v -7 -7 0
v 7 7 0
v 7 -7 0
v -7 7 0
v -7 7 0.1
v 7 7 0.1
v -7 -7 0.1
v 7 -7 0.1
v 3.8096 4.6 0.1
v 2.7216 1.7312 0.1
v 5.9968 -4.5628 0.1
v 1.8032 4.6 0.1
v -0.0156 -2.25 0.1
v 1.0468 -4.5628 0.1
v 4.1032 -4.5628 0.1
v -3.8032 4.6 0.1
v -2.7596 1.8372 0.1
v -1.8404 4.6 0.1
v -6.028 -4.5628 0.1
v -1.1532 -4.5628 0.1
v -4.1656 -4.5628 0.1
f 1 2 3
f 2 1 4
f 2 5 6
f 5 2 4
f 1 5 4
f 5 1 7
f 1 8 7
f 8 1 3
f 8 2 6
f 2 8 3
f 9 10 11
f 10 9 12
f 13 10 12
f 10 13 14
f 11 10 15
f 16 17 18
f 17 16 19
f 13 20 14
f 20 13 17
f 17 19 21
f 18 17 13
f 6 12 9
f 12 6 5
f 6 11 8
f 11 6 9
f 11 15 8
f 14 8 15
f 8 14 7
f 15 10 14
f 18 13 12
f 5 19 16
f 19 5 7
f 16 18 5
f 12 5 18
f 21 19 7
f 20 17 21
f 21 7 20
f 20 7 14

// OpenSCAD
// file: ../p/4-4edge.scad
use <../lib.scad>
$fa=1; $fs=0.2;
function ldraw_lib__4_4edge(realsolid=false) = [
// 0 Circle 1.0
// 0 Name: 4-4edge.dat
// 0 Author: James Jessiman
// 0 !LDRAW_ORG Primitive UPDATE 2017-01
// 0 !LICENSE Licensed under CC BY 2.0 and CC BY 4.0 : see CAreadme.txt
// 
// 0 BFC CERTIFY CCW
  [0,"BFC","CERTIFY"],
  [0,"BFC","CCW"],
// 
// 0 !HISTORY 1998-12-15 [PTadmin] Official Update 1998-10
// 0 !HISTORY 2005-12-28 [PTadmin] Official Update 2005-01
// 0 !HISTORY 2007-06-24 [PTadmin] Header formatted for Contributor Agreement
// 0 !HISTORY 2008-07-01 [PTadmin] Official Update 2008-01
// 0 !HISTORY 2017-01-15 [Steffen] BFCed
// 0 !HISTORY 2017-12-30 [PTadmin] Official Update 2017-01
// 
// 
// 2 24 1 0 0 0.9239 0 0.3827
  [2,24,1,0,0,0.9239,0,0.3827],
// 2 24 0.9239 0 0.3827 0.7071 0 0.7071
  [2,24,0.9239,0,0.3827,0.7071,0,0.7071],
// 2 24 0.7071 0 0.7071 0.3827 0 0.9239
  [2,24,0.7071,0,0.7071,0.3827,0,0.9239],
// 2 24 0.3827 0 0.9239 0 0 1
  [2,24,0.3827,0,0.9239,0,0,1],
// 2 24 0 0 1 -0.3827 0 0.9239
  [2,24,0,0,1,-0.3827,0,0.9239],
// 2 24 -0.3827 0 0.9239 -0.7071 0 0.7071
  [2,24,-0.3827,0,0.9239,-0.7071,0,0.7071],
// 2 24 -0.7071 0 0.7071 -0.9239 0 0.3827
  [2,24,-0.7071,0,0.7071,-0.9239,0,0.3827],
// 2 24 -0.9239 0 0.3827 -1 0 -0
  [2,24,-0.9239,0,0.3827,-1,0,-0],
// 2 24 -1 0 -0 -0.9239 0 -0.3827
  [2,24,-1,0,-0,-0.9239,0,-0.3827],
// 2 24 -0.9239 0 -0.3827 -0.7071 0 -0.7071
  [2,24,-0.9239,0,-0.3827,-0.7071,0,-0.7071],
// 2 24 -0.7071 0 -0.7071 -0.3827 0 -0.9239
  [2,24,-0.7071,0,-0.7071,-0.3827,0,-0.9239],
// 2 24 -0.3827 0 -0.9239 0 0 -1
  [2,24,-0.3827,0,-0.9239,0,0,-1],
// 2 24 0 0 -1 0.3827 0 -0.9239
  [2,24,0,0,-1,0.3827,0,-0.9239],
// 2 24 0.3827 0 -0.9239 0.7071 0 -0.7071
  [2,24,0.3827,0,-0.9239,0.7071,0,-0.7071],
// 2 24 0.7071 0 -0.7071 0.9239 0 -0.3827
  [2,24,0.7071,0,-0.7071,0.9239,0,-0.3827],
// 2 24 0.9239 0 -0.3827 1 0 0
  [2,24,0.9239,0,-0.3827,1,0,0],
];
module ldraw_lib__4_4edge(step=0, col=false, unit=2/5, alt=false, line=0.2, solid=!$preview)
    makepoly(ldraw_lib__4_4edge(solid), step=step, col=col, unit=unit, alt=alt, line=line, solid=solid);
ldraw_lib__4_4edge(line=0.2);
// file: ../p/4-4disc.scad
use <../lib.scad>
$fa=1; $fs=0.2;
function ldraw_lib__4_4disc(realsolid=false) = [
// 0 Disc 1.0
// 0 Name: 4-4disc.dat
// 0 Author: James Jessiman
// 0 !LDRAW_ORG Primitive UPDATE 2002-02
// 0 !LICENSE Licensed under CC BY 2.0 and CC BY 4.0 : see CAreadme.txt
// 
// 0 BFC CERTIFY CCW
  [0,"BFC","CERTIFY"],
  [0,"BFC","CCW"],
// 
// 0 !HISTORY 1998-12-15 [PTadmin] Official Update 1998-10
// 0 !HISTORY 2002-03-23 [sbliss] Added BFC statement
// 0 !HISTORY 2002-04-25 [PTadmin] Official Update 2002-02
// 0 !HISTORY 2007-06-24 [PTadmin] Header formatted for Contributor Agreement
// 0 !HISTORY 2008-07-01 [PTadmin] Official Update 2008-01
// 
// 
// 3 16 0 0 0 1 0 0 0.9239 0 0.3827
  [3,16,0,0,0,1,0,0,0.9239,0,0.3827],
// 3 16 0 0 0 0.9239 0 0.3827 0.7071 0 0.7071
  [3,16,0,0,0,0.9239,0,0.3827,0.7071,0,0.7071],
// 3 16 0 0 0 0.7071 0 0.7071 0.3827 0 0.9239
  [3,16,0,0,0,0.7071,0,0.7071,0.3827,0,0.9239],
// 3 16 0 0 0 0.3827 0 0.9239 0 0 1
  [3,16,0,0,0,0.3827,0,0.9239,0,0,1],
// 3 16 0 0 0 0 0 1 -0.3827 0 0.9239
  [3,16,0,0,0,0,0,1,-0.3827,0,0.9239],
// 3 16 0 0 0 -0.3827 0 0.9239 -0.7071 0 0.7071
  [3,16,0,0,0,-0.3827,0,0.9239,-0.7071,0,0.7071],
// 3 16 0 0 0 -0.7071 0 0.7071 -0.9239 0 0.3827
  [3,16,0,0,0,-0.7071,0,0.7071,-0.9239,0,0.3827],
// 3 16 0 0 0 -0.9239 0 0.3827 -1 0 -0
  [3,16,0,0,0,-0.9239,0,0.3827,-1,0,-0],
// 3 16 0 0 0 -1 0 -0 -0.9239 0 -0.3827
  [3,16,0,0,0,-1,0,-0,-0.9239,0,-0.3827],
// 3 16 0 0 0 -0.9239 0 -0.3827 -0.7071 0 -0.7071
  [3,16,0,0,0,-0.9239,0,-0.3827,-0.7071,0,-0.7071],
// 3 16 0 0 0 -0.7071 0 -0.7071 -0.3827 0 -0.9239
  [3,16,0,0,0,-0.7071,0,-0.7071,-0.3827,0,-0.9239],
// 3 16 0 0 0 -0.3827 0 -0.9239 0 0 -1
  [3,16,0,0,0,-0.3827,0,-0.9239,0,0,-1],
// 3 16 0 0 0 0 0 -1 0.3827 0 -0.9239
  [3,16,0,0,0,0,0,-1,0.3827,0,-0.9239],
// 3 16 0 0 0 0.3827 0 -0.9239 0.7071 0 -0.7071
  [3,16,0,0,0,0.3827,0,-0.9239,0.7071,0,-0.7071],
// 3 16 0 0 0 0.7071 0 -0.7071 0.9239 0 -0.3827
  [3,16,0,0,0,0.7071,0,-0.7071,0.9239,0,-0.3827],
// 3 16 0 0 0 0.9239 0 -0.3827 1 0 0
  [3,16,0,0,0,0.9239,0,-0.3827,1,0,0],
// 0
];
module ldraw_lib__4_4disc(step=0, col=false, unit=2/5, alt=false, line=0.2, solid=!$preview)
    makepoly(ldraw_lib__4_4disc(solid), step=step, col=col, unit=unit, alt=alt, line=line, solid=solid);
ldraw_lib__4_4disc(line=0.2);
// file: ../p/4-4cyli.scad
use <../lib.scad>
$fa=1; $fs=0.2;
function ldraw_lib__4_4cyli(realsolid=false) = [
// 0 Cylinder 1.0
// 0 Name: 4-4cyli.dat
// 0 Author: James Jessiman
// 0 !LDRAW_ORG Primitive UPDATE 2005-01
// 0 !LICENSE Licensed under CC BY 2.0 and CC BY 4.0 : see CAreadme.txt
// 
// 0 BFC CERTIFY CCW
  [0,"BFC","CERTIFY"],
  [0,"BFC","CCW"],
// 
// 0 !HISTORY 1998-12-15 [PTadmin] Official Update 1998-10
// 0 !HISTORY 2002-03-23 [sbliss] Added BFC statement; merged headers from files in distributions LDraw 0.27 and Complete.
// 0 !HISTORY 2002-04-25 [PTadmin] Official Update 2002-02
// 0 !HISTORY 2004-12-14 [guyvivan] BFC CCW
// 0 !HISTORY 2005-12-28 [PTadmin] Official Update 2005-01
// 0 !HISTORY 2007-06-24 [PTadmin] Header formatted for Contributor Agreement
// 0 !HISTORY 2008-07-01 [PTadmin] Official Update 2008-01
// 
// 
// 4 16 1 1 0 0.9239 1 0.3827 0.9239 0 0.3827 1 0 0
  [4,16,1,1,0,0.9239,1,0.3827,0.9239,0,0.3827,1,0,0],
// 5 24 1 0 0 1 1 0 0.9239 0 0.3827 0.9239 0 -0.3827
  [5,24,1,0,0,1,1,0,0.9239,0,0.3827,0.9239,0,-0.3827],
// 4 16 0.9239 1 0.3827 0.7071 1 0.7071 0.7071 0 0.7071 0.9239 0 0.3827
  [4,16,0.9239,1,0.3827,0.7071,1,0.7071,0.7071,0,0.7071,0.9239,0,0.3827],
// 5 24 0.9239 0 0.3827 0.9239 1 0.3827 0.7071 0 0.7071 1 0 0
  [5,24,0.9239,0,0.3827,0.9239,1,0.3827,0.7071,0,0.7071,1,0,0],
// 4 16 0.7071 1 0.7071 0.3827 1 0.9239 0.3827 0 0.9239 0.7071 0 0.7071
  [4,16,0.7071,1,0.7071,0.3827,1,0.9239,0.3827,0,0.9239,0.7071,0,0.7071],
// 5 24 0.7071 0 0.7071 0.7071 1 0.7071 0.3827 0 0.9239 0.9239 0 0.3827
  [5,24,0.7071,0,0.7071,0.7071,1,0.7071,0.3827,0,0.9239,0.9239,0,0.3827],
// 4 16 0.3827 1 0.9239 0 1 1 0 0 1 0.3827 0 0.9239
  [4,16,0.3827,1,0.9239,0,1,1,0,0,1,0.3827,0,0.9239],
// 5 24 0.3827 0 0.9239 0.3827 1 0.9239 0 0 1 0.7071 0 0.7071
  [5,24,0.3827,0,0.9239,0.3827,1,0.9239,0,0,1,0.7071,0,0.7071],
// 4 16 0 1 1 -0.3827 1 0.9239 -0.3827 0 0.9239 0 0 1
  [4,16,0,1,1,-0.3827,1,0.9239,-0.3827,0,0.9239,0,0,1],
// 5 24 0 0 1 0 1 1 -0.3827 0 0.9239 0.3827 0 0.9239
  [5,24,0,0,1,0,1,1,-0.3827,0,0.9239,0.3827,0,0.9239],
// 4 16 -0.3827 1 0.9239 -0.7071 1 0.7071 -0.7071 0 0.7071 -0.3827 0 0.9239
  [4,16,-0.3827,1,0.9239,-0.7071,1,0.7071,-0.7071,0,0.7071,-0.3827,0,0.9239],
// 5 24 -0.3827 0 0.9239 -0.3827 1 0.9239 -0.7071 0 0.7071 0 0 1
  [5,24,-0.3827,0,0.9239,-0.3827,1,0.9239,-0.7071,0,0.7071,0,0,1],
// 4 16 -0.7071 1 0.7071 -0.9239 1 0.3827 -0.9239 0 0.3827 -0.7071 0 0.7071
  [4,16,-0.7071,1,0.7071,-0.9239,1,0.3827,-0.9239,0,0.3827,-0.7071,0,0.7071],
// 5 24 -0.7071 0 0.7071 -0.7071 1 0.7071 -0.9239 0 0.3827 -0.3827 0 0.9239
  [5,24,-0.7071,0,0.7071,-0.7071,1,0.7071,-0.9239,0,0.3827,-0.3827,0,0.9239],
// 4 16 -0.9239 1 0.3827 -1 1 0 -1 0 0 -0.9239 0 0.3827
  [4,16,-0.9239,1,0.3827,-1,1,0,-1,0,0,-0.9239,0,0.3827],
// 5 24 -0.9239 0 0.3827 -0.9239 1 0.3827 -1 0 0 -0.7071 0 0.7071
  [5,24,-0.9239,0,0.3827,-0.9239,1,0.3827,-1,0,0,-0.7071,0,0.7071],
// 4 16 -1 1 0 -0.9239 1 -0.3827 -0.9239 0 -0.3827 -1 0 0
  [4,16,-1,1,0,-0.9239,1,-0.3827,-0.9239,0,-0.3827,-1,0,0],
// 5 24 -1 0 0 -1 1 0 -0.9239 0 -0.3827 -0.9239 0 0.3827
  [5,24,-1,0,0,-1,1,0,-0.9239,0,-0.3827,-0.9239,0,0.3827],
// 4 16 -0.9239 1 -0.3827 -0.7071 1 -0.7071 -0.7071 0 -0.7071 -0.9239 0 -0.3827
  [4,16,-0.9239,1,-0.3827,-0.7071,1,-0.7071,-0.7071,0,-0.7071,-0.9239,0,-0.3827],
// 5 24 -0.9239 0 -0.3827 -0.9239 1 -0.3827 -0.7071 0 -0.7071 -1 0 0
  [5,24,-0.9239,0,-0.3827,-0.9239,1,-0.3827,-0.7071,0,-0.7071,-1,0,0],
// 4 16 -0.7071 1 -0.7071 -0.3827 1 -0.9239 -0.3827 0 -0.9239 -0.7071 0 -0.7071
  [4,16,-0.7071,1,-0.7071,-0.3827,1,-0.9239,-0.3827,0,-0.9239,-0.7071,0,-0.7071],
// 5 24 -0.7071 0 -0.7071 -0.7071 1 -0.7071 -0.3827 0 -0.9239 -0.9239 0 -0.3827
  [5,24,-0.7071,0,-0.7071,-0.7071,1,-0.7071,-0.3827,0,-0.9239,-0.9239,0,-0.3827],
// 4 16 -0.3827 1 -0.9239 0 1 -1 0 0 -1 -0.3827 0 -0.9239
  [4,16,-0.3827,1,-0.9239,0,1,-1,0,0,-1,-0.3827,0,-0.9239],
// 5 24 -0.3827 0 -0.9239 -0.3827 1 -0.9239 0 0 -1 -0.7071 0 -0.7071
  [5,24,-0.3827,0,-0.9239,-0.3827,1,-0.9239,0,0,-1,-0.7071,0,-0.7071],
// 4 16 0 1 -1 0.3827 1 -0.9239 0.3827 0 -0.9239 0 0 -1
  [4,16,0,1,-1,0.3827,1,-0.9239,0.3827,0,-0.9239,0,0,-1],
// 5 24 0 0 -1 0 1 -1 0.3827 0 -0.9239 -0.3827 0 -0.9239
  [5,24,0,0,-1,0,1,-1,0.3827,0,-0.9239,-0.3827,0,-0.9239],
// 4 16 0.3827 1 -0.9239 0.7071 1 -0.7071 0.7071 0 -0.7071 0.3827 0 -0.9239
  [4,16,0.3827,1,-0.9239,0.7071,1,-0.7071,0.7071,0,-0.7071,0.3827,0,-0.9239],
// 5 24 0.3827 0 -0.9239 0.3827 1 -0.9239 0.7071 0 -0.7071 0 0 -1
  [5,24,0.3827,0,-0.9239,0.3827,1,-0.9239,0.7071,0,-0.7071,0,0,-1],
// 4 16 0.7071 1 -0.7071 0.9239 1 -0.3827 0.9239 0 -0.3827 0.7071 0 -0.7071
  [4,16,0.7071,1,-0.7071,0.9239,1,-0.3827,0.9239,0,-0.3827,0.7071,0,-0.7071],
// 5 24 0.7071 0 -0.7071 0.7071 1 -0.7071 0.9239 0 -0.3827 0.3827 0 -0.9239
  [5,24,0.7071,0,-0.7071,0.7071,1,-0.7071,0.9239,0,-0.3827,0.3827,0,-0.9239],
// 4 16 0.9239 1 -0.3827 1 1 0 1 0 0 0.9239 0 -0.3827
  [4,16,0.9239,1,-0.3827,1,1,0,1,0,0,0.9239,0,-0.3827],
// 5 24 0.9239 0 -0.3827 0.9239 1 -0.3827 1 0 0 0.7071 0 -0.7071
  [5,24,0.9239,0,-0.3827,0.9239,1,-0.3827,1,0,0,0.7071,0,-0.7071],
// 0
];
module ldraw_lib__4_4cyli(step=0, col=false, unit=2/5, alt=false, line=0.2, solid=!$preview)
    makepoly(ldraw_lib__4_4cyli(solid), step=step, col=col, unit=unit, alt=alt, line=line, solid=solid);
ldraw_lib__4_4cyli(line=0.2);
// file: ../p/stud3.scad
use <../lib.scad>
use <4-4cyli.scad>
use <4-4disc.scad>
use <4-4edge.scad>
$fa=1; $fs=0.2;
function ldraw_lib__stud3(realsolid=false) = realsolid ? 
    [openscad(translate([0,0,-eps()], o=cylinder(4+eps(), r=4)),2)] : [
// 0 Stud Tube Solid
// 0 Name: stud3.dat
// 0 Author: James Jessiman
// 0 !LDRAW_ORG Primitive UPDATE 2012-01
// 0 !LICENSE Licensed under CC BY 2.0 and CC BY 4.0 : see CAreadme.txt
// 
// 0 BFC CERTIFY CCW
  [0,"BFC","CERTIFY"],
  [0,"BFC","CCW"],
// 
// 0 !HISTORY 2002-04-04 [sbliss] Modified for BFC compliance
// 0 !HISTORY 2002-04-25 [PTadmin] Official Update 2002-02
// 0 !HISTORY 2007-06-24 [PTadmin] Header formatted for Contributor Agreement
// 0 !HISTORY 2008-07-01 [PTadmin] Official Update 2008-01
// 0 !HISTORY 2012-02-16 [Philo] Changed to CCW
// 0 !HISTORY 2012-03-30 [PTadmin] Official Update 2012-01
// 
// 
// 1 16 0 -4 0 4 0 0 0 1 0 0 0 4 4-4edge.dat
  [1,16,0,-4,0,4,0,0,0,1,0,0,0,4, ldraw_lib__4_4edge(realsolid)],
// 1 16 0 0 0 4 0 0 0 1 0 0 0 4 4-4edge.dat
  [1,16,0,0,0,4,0,0,0,1,0,0,0,4, ldraw_lib__4_4edge(realsolid)],
// 1 16 0 -4 0 4 0 0 0 1 0 0 0 4 4-4disc.dat
  [1,16,0,-4,0,4,0,0,0,1,0,0,0,4, ldraw_lib__4_4disc(realsolid)],
// 1 16 0 -4 0 4 0 0 0 4 0 0 0 4 4-4cyli.dat
  [1,16,0,-4,0,4,0,0,0,4,0,0,0,4, ldraw_lib__4_4cyli(realsolid)],
];
module ldraw_lib__stud3(step=0, col=false, unit=2/5, alt=false, line=0.2, solid=!$preview)
    makepoly(ldraw_lib__stud3(solid), step=step, col=col, unit=unit, alt=alt, line=line, solid=solid);
ldraw_lib__stud3(line=0.2);
// file: ../p/stud.scad
use <../lib.scad>
use <4-4cyli.scad>
use <4-4disc.scad>
use <4-4edge.scad>
$fa=1; $fs=0.2;
function ldraw_lib__stud(realsolid=false) = realsolid ? 
    [openscad(translate([0,0,-eps()], o=cylinder(4+eps(), r=6)),2)] : [
// 0 Stud
// 0 Name: stud.dat
// 0 Author: James Jessiman
// 0 !LDRAW_ORG Primitive UPDATE 2012-01
// 0 !LICENSE Licensed under CC BY 2.0 and CC BY 4.0 : see CAreadme.txt
// 
// 0 BFC CERTIFY CCW
  [0,"BFC","CERTIFY"],
  [0,"BFC","CCW"],
// 
// 0 !HISTORY 2002-04-04 [sbliss] Modified for BFC compliance
// 0 !HISTORY 2002-04-25 [PTadmin] Official Update 2002-02
// 0 !HISTORY 2007-06-24 [PTadmin] Header formatted for Contributor Agreement
// 0 !HISTORY 2008-07-01 [PTadmin] Official Update 2008-01
// 0 !HISTORY 2012-02-16 [Philo] Changed to CCW
// 0 !HISTORY 2012-03-30 [PTadmin] Official Update 2012-01
// 
// 
// 1 16 0 0 0 6 0 0 0 1 0 0 0 6 4-4edge.dat
  [1,16,0,0,0,6,0,0,0,1,0,0,0,6, ldraw_lib__4_4edge(realsolid)],
// 1 16 0 -4 0 6 0 0 0 1 0 0 0 6 4-4edge.dat
  [1,16,0,-4,0,6,0,0,0,1,0,0,0,6, ldraw_lib__4_4edge(realsolid)],
// 1 16 0 0 0 6 0 0 0 -4 0 0 0 6 4-4cyli.dat
  [1,16,0,0,0,6,0,0,0,-4,0,0,0,6, ldraw_lib__4_4cyli(realsolid)],
// 1 16 0 -4 0 6 0 0 0 1 0 0 0 6 4-4disc.dat
  [1,16,0,-4,0,6,0,0,0,1,0,0,0,6, ldraw_lib__4_4disc(realsolid)],
];
module ldraw_lib__stud(step=0, col=false, unit=2/5, alt=false, line=0.2, solid=!$preview)
    makepoly(ldraw_lib__stud(solid), step=step, col=col, unit=unit, alt=alt, line=line, solid=solid);
ldraw_lib__stud(line=0.2);
// file: ../p/box5.scad
use <../lib.scad>
$fa=1; $fs=0.2;
function ldraw_lib__box5(realsolid=false) = [
// 0 Box with 5 Faces and All Edges
// 0 Name: box5.dat
// 0 Author: James Jessiman
// 0 !LDRAW_ORG Primitive UPDATE 2012-01
// 0 !LICENSE Licensed under CC BY 2.0 and CC BY 4.0 : see CAreadme.txt
// 
// 0 BFC CERTIFY CCW
  [0,"BFC","CERTIFY"],
  [0,"BFC","CCW"],
// 
// 0 !HISTORY 2002-04-03 [sbliss] Modified for BFC compliance
// 0 !HISTORY 2002-04-25 [PTadmin] Official Update 2002-02
// 0 !HISTORY 2007-06-24 [PTadmin] Header formatted for Contributor Agreement
// 0 !HISTORY 2008-07-01 [PTadmin] Official Update 2008-01
// 0 !HISTORY 2012-02-16 [Philo] Changed to CCW
// 0 !HISTORY 2012-03-30 [PTadmin] Official Update 2012-01
// 
// 
// 2 24 1 1 1 -1 1 1
  [2,24,1,1,1,-1,1,1],
// 2 24 -1 1 1 -1 1 -1
  [2,24,-1,1,1,-1,1,-1],
// 2 24 -1 1 -1 1 1 -1
  [2,24,-1,1,-1,1,1,-1],
// 2 24 1 1 -1 1 1 1
  [2,24,1,1,-1,1,1,1],
// 2 24 1 0 1 -1 0 1
  [2,24,1,0,1,-1,0,1],
// 2 24 -1 0 1 -1 0 -1
  [2,24,-1,0,1,-1,0,-1],
// 2 24 -1 0 -1 1 0 -1
  [2,24,-1,0,-1,1,0,-1],
// 2 24 1 0 -1 1 0 1
  [2,24,1,0,-1,1,0,1],
// 2 24 1 0 1 1 1 1
  [2,24,1,0,1,1,1,1],
// 2 24 -1 0 1 -1 1 1
  [2,24,-1,0,1,-1,1,1],
// 2 24 1 0 -1 1 1 -1
  [2,24,1,0,-1,1,1,-1],
// 2 24 -1 0 -1 -1 1 -1
  [2,24,-1,0,-1,-1,1,-1],
// 4 16 -1 1 1 1 1 1 1 1 -1 -1 1 -1
  [4,16,-1,1,1,1,1,1,1,1,-1,-1,1,-1],
// 4 16 -1 1 1 -1 0 1 1 0 1 1 1 1
  [4,16,-1,1,1,-1,0,1,1,0,1,1,1,1],
// 4 16 -1 1 -1 -1 0 -1 -1 0 1 -1 1 1
  [4,16,-1,1,-1,-1,0,-1,-1,0,1,-1,1,1],
// 4 16 1 1 -1 1 0 -1 -1 0 -1 -1 1 -1
  [4,16,1,1,-1,1,0,-1,-1,0,-1,-1,1,-1],
// 4 16 1 1 1 1 0 1 1 0 -1 1 1 -1
  [4,16,1,1,1,1,0,1,1,0,-1,1,1,-1],
];
module ldraw_lib__box5(step=0, col=false, unit=2/5, alt=false, line=0.2, solid=!$preview)
    makepoly(ldraw_lib__box5(solid), step=step, col=col, unit=unit, alt=alt, line=line, solid=solid);
ldraw_lib__box5(line=0.2);
// file: ../p/box4t.scad
use <../lib.scad>
$fa=1; $fs=0.2;
function ldraw_lib__box4t(realsolid=false) = [
// 0 Box with 4 Adjacent Faces and All Edges
// 0 Name: box4t.dat
// 0 Author: Tore Eriksson [Tore_Eriksson]
// 0 !LDRAW_ORG Primitive UPDATE 2003-02
// 0 !LICENSE Licensed under CC BY 2.0 and CC BY 4.0 : see CAreadme.txt
// 
// 0 BFC CERTIFY CCW
  [0,"BFC","CERTIFY"],
  [0,"BFC","CCW"],
// 
// 0 !HISTORY 1997-09-29 [PTadmin] Official Update 1997-15
// 0 !HISTORY 2002-08-31 [izanette] Modified with WINDZ for BFC compliance
// 0 !HISTORY 2003-08-01 [PTadmin] Official Update 2003-02
// 0 !HISTORY 2007-06-24 [PTadmin] Header formatted for Contributor Agreement
// 0 !HISTORY 2008-07-01 [PTadmin] Official Update 2008-01
// 
// 
// 2 24 1 1 1 -1 1 1
  [2,24,1,1,1,-1,1,1],
// 2 24 -1 1 1 -1 1 -1
  [2,24,-1,1,1,-1,1,-1],
// 2 24 -1 1 -1 1 1 -1
  [2,24,-1,1,-1,1,1,-1],
// 2 24 1 1 -1 1 1 1
  [2,24,1,1,-1,1,1,1],
// 2 24 1 0 1 -1 0 1
  [2,24,1,0,1,-1,0,1],
// 2 24 -1 0 1 -1 0 -1
  [2,24,-1,0,1,-1,0,-1],
// 2 24 -1 0 -1 1 0 -1
  [2,24,-1,0,-1,1,0,-1],
// 2 24 1 0 -1 1 0 1
  [2,24,1,0,-1,1,0,1],
// 2 24 1 0 1 1 1 1
  [2,24,1,0,1,1,1,1],
// 2 24 -1 0 1 -1 1 1
  [2,24,-1,0,1,-1,1,1],
// 2 24 1 0 -1 1 1 -1
  [2,24,1,0,-1,1,1,-1],
// 2 24 -1 0 -1 -1 1 -1
  [2,24,-1,0,-1,-1,1,-1],
// 4 16 1 1 1 1 1 -1 -1 1 -1 -1 1 1
  [4,16,1,1,1,1,1,-1,-1,1,-1,-1,1,1],
// 4 16 1 1 1 -1 1 1 -1 0 1 1 0 1
  [4,16,1,1,1,-1,1,1,-1,0,1,1,0,1],
// 4 16 -1 1 1 -1 1 -1 -1 0 -1 -1 0 1
  [4,16,-1,1,1,-1,1,-1,-1,0,-1,-1,0,1],
// 0 4 16 -1 1 -1 -1 0 -1 1 0 -1 1 1 -1
// 4 16 1 1 -1 1 1 1 1 0 1 1 0 -1
  [4,16,1,1,-1,1,1,1,1,0,1,1,0,-1],
// 0
];
module ldraw_lib__box4t(step=0, col=false, unit=2/5, alt=false, line=0.2, solid=!$preview)
    makepoly(ldraw_lib__box4t(solid), step=step, col=col, unit=unit, alt=alt, line=line, solid=solid);
ldraw_lib__box4t(line=0.2);
// file: s/3004s01.scad
use <../../lib.scad>
use <../../p/box4t.scad>
use <../../p/box5.scad>
use <../../p/stud.scad>
use <../../p/stud3.scad>
$fa=1; $fs=0.2;
function ldraw_lib__s__3004s01(realsolid=false) = [
// 0 ~Brick  1 x  2 without Front Face
// 0 Name: s\3004s01.dat
// 0 Author: James Jessiman
// 0 !LDRAW_ORG Subpart UPDATE 2003-03
// 0 !LICENSE Licensed under CC BY 2.0 and CC BY 4.0 : see CAreadme.txt
// 
// 0 BFC CERTIFY CCW
  [0,"BFC","CERTIFY"],
  [0,"BFC","CCW"],
// 
// 0 !HISTORY 2003-09-07 [jriley] Subfiling, BFC
// 0 !HISTORY 2003-12-19 [PTadmin] Official Update 2003-03
// 0 !HISTORY 2007-08-29 [PTadmin] Header formatted for Contributor Agreement
// 0 !HISTORY 2008-07-01 [PTadmin] Official Update 2008-01
// 
// 
// 1 16 0 4 0 1 0 0 0 -5 0 0 0 1 stud3.dat
  [1,16,0,4,0,1,0,0,0,-5,0,0,0,1, ldraw_lib__stud3(realsolid)],
// 0 BFC INVERTNEXT
  [0,"BFC","INVERTNEXT"],
// 1 16 0 24 0 16 0 0 0 -20 0 0 0 6 box5.dat
  [1,16,0,24,0,16,0,0,0,-20,0,0,0,6, ldraw_lib__box5(realsolid)],
// 4 16 20 24 10 16 24 6 -16 24 6 -20 24 10
  [4,16,20,24,10,16,24,6,-16,24,6,-20,24,10],
// 4 16 -20 24 10 -16 24 6 -16 24 -6 -20 24 -10
  [4,16,-20,24,10,-16,24,6,-16,24,-6,-20,24,-10],
// 4 16 -20 24 -10 -16 24 -6 16 24 -6 20 24 -10
  [4,16,-20,24,-10,-16,24,-6,16,24,-6,20,24,-10],
// 4 16 20 24 -10 16 24 -6 16 24 6 20 24 10
  [4,16,20,24,-10,16,24,-6,16,24,6,20,24,10],
// 1 16 0 24 0 20 0 0 0 -24 0 0 0 10 box4t.dat
  [1,16,0,24,0,20,0,0,0,-24,0,0,0,10, ldraw_lib__box4t(realsolid)],
// 1 16 10 0 0 1 0 0 0 1 0 0 0 1 stud.dat
  [1,16,10,0,0,1,0,0,0,1,0,0,0,1, ldraw_lib__stud(realsolid)],
// 1 16 -10 0 0 1 0 0 0 1 0 0 0 1 stud.dat
  [1,16,-10,0,0,1,0,0,0,1,0,0,0,1, ldraw_lib__stud(realsolid)],
// 0
];
module ldraw_lib__s__3004s01(step=0, col=false, unit=2/5, alt=false, line=0.2, solid=!$preview)
    makepoly(ldraw_lib__s__3004s01(solid), step=step, col=col, unit=unit, alt=alt, line=line, solid=solid);
ldraw_lib__s__3004s01(line=0.2);
// file: 3004.scad
use <../lib.scad>
use <s/3004s01.scad>
$fa=1; $fs=0.2;
function ldraw_lib__3004(realsolid=false) = [
// 0 Brick  1 x  2
// 0 Name: 3004.dat
// 0 Author: James Jessiman
// 0 !LDRAW_ORG Part UPDATE 2022-05
// 0 !LICENSE Licensed under CC BY 2.0 and CC BY 4.0 : see CAreadme.txt
// 
// 0 BFC CERTIFY CCW
  [0,"BFC","CERTIFY"],
  [0,"BFC","CCW"],
// 
// 0 !HISTORY 2001-10-26 [PTadmin] Official Update 2001-01
// 0 !HISTORY 2002-05-07 {unknown} BFC Certification
// 0 !HISTORY 2002-06-11 [PTadmin] Official Update 2002-03
// 0 !HISTORY 2007-05-07 [PTadmin] Header formatted for Contributor Agreement
// 0 !HISTORY 2008-07-01 [PTadmin] Official Update 2008-01
// 0 !HISTORY 2022-08-04 [MagFors] Using subfile
// 0 !HISTORY 2022-09-15 [PTadmin] Official Update 2022-05
// 
// 
// 1 16 0 0 0 1 0 0 0 1 0 0 0 1 s\3004s01.dat
  [1,16,0,0,0,1,0,0,0,1,0,0,0,1, ldraw_lib__s__3004s01(realsolid)],
// 4 16 -20 24 -10 20 24 -10 20 0 -10 -20 0 -10
  [4,16,-20,24,-10,20,24,-10,20,0,-10,-20,0,-10],
];
module ldraw_lib__3004(step=0, col=false, unit=2/5, alt=false, line=0.2, solid=!$preview)
    makepoly(ldraw_lib__3004(solid), step=step, col=col, unit=unit, alt=alt, line=line, solid=solid);
ldraw_lib__3004(line=0.2);
// file: ../p/box5-12.scad
use <../lib.scad>
$fa=1; $fs=0.2;
function ldraw_lib__box5_12(realsolid=false) = [
// 0 Box with 5 Faces without Any Edges
// 0 Name: box5-12.dat
// 0 Author: Chris Dee [cwdee]
// 0 !LDRAW_ORG Primitive UPDATE 2009-02
// 0 !LICENSE Licensed under CC BY 2.0 and CC BY 4.0 : see CAreadme.txt
// 
// 0 BFC CERTIFY CCW
  [0,"BFC","CERTIFY"],
  [0,"BFC","CCW"],
// 
// 0 !HISTORY 2009-09-03 [PTadmin] Official Update 2009-02
// 
// 
// 4 16 1 1 1 1 1 -1 -1 1 -1 -1 1 1
  [4,16,1,1,1,1,1,-1,-1,1,-1,-1,1,1],
// 4 16 -1 0 1 1 0 1 1 1 1 -1 1 1
  [4,16,-1,0,1,1,0,1,1,1,1,-1,1,1],
// 4 16 -1 0 -1 -1 0 1 -1 1 1 -1 1 -1
  [4,16,-1,0,-1,-1,0,1,-1,1,1,-1,1,-1],
// 4 16 1 0 -1 -1 0 -1 -1 1 -1 1 1 -1
  [4,16,1,0,-1,-1,0,-1,-1,1,-1,1,1,-1],
// 4 16 1 0 1 1 0 -1 1 1 -1 1 1 1
  [4,16,1,0,1,1,0,-1,1,1,-1,1,1,1],
// 0
];
module ldraw_lib__box5_12(step=0, col=false, unit=2/5, alt=false, line=0.2, solid=!$preview)
    makepoly(ldraw_lib__box5_12(solid), step=step, col=col, unit=unit, alt=alt, line=line, solid=solid);
ldraw_lib__box5_12(line=0.2);
// main file
use <../lib.scad>
use <../p/box5-12.scad>
$fa=1; $fs=0.2;
function ldraw_lib__4521703s(realsolid=false) = [
// 0 Sticker  1.7 x  1.7 with Dark_Red "M"
// 0 Name: 4521703s.dat
// 0 Author: J.C. Tchang [tchang]
// 0 !LDRAW_ORG Part UPDATE 2011-01
// 0 !LICENSE Licensed under CC BY 2.0 and CC BY 4.0 : see CAreadme.txt
// 
// 0 BFC CERTIFY CCW
  [0,"BFC","CERTIFY"],
  [0,"BFC","CCW"],
// 
// 0 !HISTORY 2011-07-25 [PTadmin] Official Update 2011-01
// 
// 
// 1 15 0 -0.25 0 17.5 0 0 0 0.25 0 0 0 17.5 box5-12.dat
  [1,15,0,-0.25,0,17.5,0,0,0,0.25,0,0,0,17.5, ldraw_lib__box5_12(realsolid)],
// 0 //
// 4 320 9.524 -0.25 11.5 4.508 -0.25 11.5 6.804 -0.25 4.328 14.992 -0.25 -11.407
  [4,320,9.524,-0.25,11.5,4.508,-0.25,11.5,6.804,-0.25,4.328,14.992,-0.25,-11.407],
// 4 320 -0.039 -0.25 -5.625 2.617 -0.25 -11.407 6.804 -0.25 4.328 4.508 -0.25 11.5
  [4,320,-0.039,-0.25,-5.625,2.617,-0.25,-11.407,6.804,-0.25,4.328,4.508,-0.25,11.5],
// 3 320 14.992 -0.25 -11.407 6.804 -0.25 4.328 10.258 -0.25 -11.407
  [3,320,14.992,-0.25,-11.407,6.804,-0.25,4.328,10.258,-0.25,-11.407],
// 4 320 -6.899 -0.25 4.593 -4.601 -0.25 11.5 -9.508 -0.25 11.5 -15.07 -0.25 -11.407
  [4,320,-6.899,-0.25,4.593,-4.601,-0.25,11.5,-9.508,-0.25,11.5,-15.07,-0.25,-11.407],
// 4 320 -2.883 -0.25 -11.407 2.617 -0.25 -11.407 -0.039 -0.25 -5.625 -6.899 -0.25 4.593
  [4,320,-2.883,-0.25,-11.407,2.617,-0.25,-11.407,-0.039,-0.25,-5.625,-6.899,-0.25,4.593],
// 3 320 -6.899 -0.25 4.593 -15.07 -0.25 -11.407 -10.414 -0.25 -11.407
  [3,320,-6.899,-0.25,4.593,-15.07,-0.25,-11.407,-10.414,-0.25,-11.407],
// 3 320 -4.601 -0.25 11.5 -6.899 -0.25 4.593 -0.039 -0.25 -5.625
  [3,320,-4.601,-0.25,11.5,-6.899,-0.25,4.593,-0.039,-0.25,-5.625],
// 0 //
// 4 15 4.508 -0.25 11.5 9.524 -0.25 11.5 17.5 -0.25 17.5 -17.5 -0.25 17.5
  [4,15,4.508,-0.25,11.5,9.524,-0.25,11.5,17.5,-0.25,17.5,-17.5,-0.25,17.5],
// 4 15 17.5 -0.25 17.5 9.524 -0.25 11.5 14.992 -0.25 -11.407 17.5 -0.25 -17.5
  [4,15,17.5,-0.25,17.5,9.524,-0.25,11.5,14.992,-0.25,-11.407,17.5,-0.25,-17.5],
// 3 15 14.992 -0.25 -11.407 10.258 -0.25 -11.407 17.5 -0.25 -17.5
  [3,15,14.992,-0.25,-11.407,10.258,-0.25,-11.407,17.5,-0.25,-17.5],
// 4 15 17.5 -0.25 -17.5 10.258 -0.25 -11.407 2.617 -0.25 -11.407 -17.5 -0.25 -17.5
  [4,15,17.5,-0.25,-17.5,10.258,-0.25,-11.407,2.617,-0.25,-11.407,-17.5,-0.25,-17.5],
// 3 15 10.258 -0.25 -11.407 6.804 -0.25 4.328 2.617 -0.25 -11.407
  [3,15,10.258,-0.25,-11.407,6.804,-0.25,4.328,2.617,-0.25,-11.407],
// 3 15 -4.601 -0.25 11.5 -0.039 -0.25 -5.625 4.508 -0.25 11.5
  [3,15,-4.601,-0.25,11.5,-0.039,-0.25,-5.625,4.508,-0.25,11.5],
// 4 15 -15.07 -0.25 -11.407 -9.508 -0.25 11.5 -17.5 -0.25 17.5 -17.5 -0.25 -17.5
  [4,15,-15.07,-0.25,-11.407,-9.508,-0.25,11.5,-17.5,-0.25,17.5,-17.5,-0.25,-17.5],
// 3 15 -9.508 -0.25 11.5 -4.601 -0.25 11.5 -17.5 -0.25 17.5
  [3,15,-9.508,-0.25,11.5,-4.601,-0.25,11.5,-17.5,-0.25,17.5],
// 3 15 4.508 -0.25 11.5 -17.5 -0.25 17.5 -4.601 -0.25 11.5
  [3,15,4.508,-0.25,11.5,-17.5,-0.25,17.5,-4.601,-0.25,11.5],
// 3 15 -10.414 -0.25 -11.407 -15.07 -0.25 -11.407 -17.5 -0.25 -17.5
  [3,15,-10.414,-0.25,-11.407,-15.07,-0.25,-11.407,-17.5,-0.25,-17.5],
// 3 15 -2.883 -0.25 -11.407 -6.899 -0.25 4.593 -10.414 -0.25 -11.407
  [3,15,-2.883,-0.25,-11.407,-6.899,-0.25,4.593,-10.414,-0.25,-11.407],
// 3 15 -10.414 -0.25 -11.407 -17.5 -0.25 -17.5 -2.883 -0.25 -11.407
  [3,15,-10.414,-0.25,-11.407,-17.5,-0.25,-17.5,-2.883,-0.25,-11.407],
// 3 15 -2.883 -0.25 -11.407 -17.5 -0.25 -17.5 2.617 -0.25 -11.407
  [3,15,-2.883,-0.25,-11.407,-17.5,-0.25,-17.5,2.617,-0.25,-11.407],
// 0 //
];
module ldraw_lib__4521703s(step=0, col=false, unit=2/5, alt=false, line=0.2, solid=!$preview)
    makepoly(ldraw_lib__4521703s(solid), step=step, col=col, unit=unit, alt=alt, line=line, solid=solid);
ldraw_lib__4521703s(line=0.2);
